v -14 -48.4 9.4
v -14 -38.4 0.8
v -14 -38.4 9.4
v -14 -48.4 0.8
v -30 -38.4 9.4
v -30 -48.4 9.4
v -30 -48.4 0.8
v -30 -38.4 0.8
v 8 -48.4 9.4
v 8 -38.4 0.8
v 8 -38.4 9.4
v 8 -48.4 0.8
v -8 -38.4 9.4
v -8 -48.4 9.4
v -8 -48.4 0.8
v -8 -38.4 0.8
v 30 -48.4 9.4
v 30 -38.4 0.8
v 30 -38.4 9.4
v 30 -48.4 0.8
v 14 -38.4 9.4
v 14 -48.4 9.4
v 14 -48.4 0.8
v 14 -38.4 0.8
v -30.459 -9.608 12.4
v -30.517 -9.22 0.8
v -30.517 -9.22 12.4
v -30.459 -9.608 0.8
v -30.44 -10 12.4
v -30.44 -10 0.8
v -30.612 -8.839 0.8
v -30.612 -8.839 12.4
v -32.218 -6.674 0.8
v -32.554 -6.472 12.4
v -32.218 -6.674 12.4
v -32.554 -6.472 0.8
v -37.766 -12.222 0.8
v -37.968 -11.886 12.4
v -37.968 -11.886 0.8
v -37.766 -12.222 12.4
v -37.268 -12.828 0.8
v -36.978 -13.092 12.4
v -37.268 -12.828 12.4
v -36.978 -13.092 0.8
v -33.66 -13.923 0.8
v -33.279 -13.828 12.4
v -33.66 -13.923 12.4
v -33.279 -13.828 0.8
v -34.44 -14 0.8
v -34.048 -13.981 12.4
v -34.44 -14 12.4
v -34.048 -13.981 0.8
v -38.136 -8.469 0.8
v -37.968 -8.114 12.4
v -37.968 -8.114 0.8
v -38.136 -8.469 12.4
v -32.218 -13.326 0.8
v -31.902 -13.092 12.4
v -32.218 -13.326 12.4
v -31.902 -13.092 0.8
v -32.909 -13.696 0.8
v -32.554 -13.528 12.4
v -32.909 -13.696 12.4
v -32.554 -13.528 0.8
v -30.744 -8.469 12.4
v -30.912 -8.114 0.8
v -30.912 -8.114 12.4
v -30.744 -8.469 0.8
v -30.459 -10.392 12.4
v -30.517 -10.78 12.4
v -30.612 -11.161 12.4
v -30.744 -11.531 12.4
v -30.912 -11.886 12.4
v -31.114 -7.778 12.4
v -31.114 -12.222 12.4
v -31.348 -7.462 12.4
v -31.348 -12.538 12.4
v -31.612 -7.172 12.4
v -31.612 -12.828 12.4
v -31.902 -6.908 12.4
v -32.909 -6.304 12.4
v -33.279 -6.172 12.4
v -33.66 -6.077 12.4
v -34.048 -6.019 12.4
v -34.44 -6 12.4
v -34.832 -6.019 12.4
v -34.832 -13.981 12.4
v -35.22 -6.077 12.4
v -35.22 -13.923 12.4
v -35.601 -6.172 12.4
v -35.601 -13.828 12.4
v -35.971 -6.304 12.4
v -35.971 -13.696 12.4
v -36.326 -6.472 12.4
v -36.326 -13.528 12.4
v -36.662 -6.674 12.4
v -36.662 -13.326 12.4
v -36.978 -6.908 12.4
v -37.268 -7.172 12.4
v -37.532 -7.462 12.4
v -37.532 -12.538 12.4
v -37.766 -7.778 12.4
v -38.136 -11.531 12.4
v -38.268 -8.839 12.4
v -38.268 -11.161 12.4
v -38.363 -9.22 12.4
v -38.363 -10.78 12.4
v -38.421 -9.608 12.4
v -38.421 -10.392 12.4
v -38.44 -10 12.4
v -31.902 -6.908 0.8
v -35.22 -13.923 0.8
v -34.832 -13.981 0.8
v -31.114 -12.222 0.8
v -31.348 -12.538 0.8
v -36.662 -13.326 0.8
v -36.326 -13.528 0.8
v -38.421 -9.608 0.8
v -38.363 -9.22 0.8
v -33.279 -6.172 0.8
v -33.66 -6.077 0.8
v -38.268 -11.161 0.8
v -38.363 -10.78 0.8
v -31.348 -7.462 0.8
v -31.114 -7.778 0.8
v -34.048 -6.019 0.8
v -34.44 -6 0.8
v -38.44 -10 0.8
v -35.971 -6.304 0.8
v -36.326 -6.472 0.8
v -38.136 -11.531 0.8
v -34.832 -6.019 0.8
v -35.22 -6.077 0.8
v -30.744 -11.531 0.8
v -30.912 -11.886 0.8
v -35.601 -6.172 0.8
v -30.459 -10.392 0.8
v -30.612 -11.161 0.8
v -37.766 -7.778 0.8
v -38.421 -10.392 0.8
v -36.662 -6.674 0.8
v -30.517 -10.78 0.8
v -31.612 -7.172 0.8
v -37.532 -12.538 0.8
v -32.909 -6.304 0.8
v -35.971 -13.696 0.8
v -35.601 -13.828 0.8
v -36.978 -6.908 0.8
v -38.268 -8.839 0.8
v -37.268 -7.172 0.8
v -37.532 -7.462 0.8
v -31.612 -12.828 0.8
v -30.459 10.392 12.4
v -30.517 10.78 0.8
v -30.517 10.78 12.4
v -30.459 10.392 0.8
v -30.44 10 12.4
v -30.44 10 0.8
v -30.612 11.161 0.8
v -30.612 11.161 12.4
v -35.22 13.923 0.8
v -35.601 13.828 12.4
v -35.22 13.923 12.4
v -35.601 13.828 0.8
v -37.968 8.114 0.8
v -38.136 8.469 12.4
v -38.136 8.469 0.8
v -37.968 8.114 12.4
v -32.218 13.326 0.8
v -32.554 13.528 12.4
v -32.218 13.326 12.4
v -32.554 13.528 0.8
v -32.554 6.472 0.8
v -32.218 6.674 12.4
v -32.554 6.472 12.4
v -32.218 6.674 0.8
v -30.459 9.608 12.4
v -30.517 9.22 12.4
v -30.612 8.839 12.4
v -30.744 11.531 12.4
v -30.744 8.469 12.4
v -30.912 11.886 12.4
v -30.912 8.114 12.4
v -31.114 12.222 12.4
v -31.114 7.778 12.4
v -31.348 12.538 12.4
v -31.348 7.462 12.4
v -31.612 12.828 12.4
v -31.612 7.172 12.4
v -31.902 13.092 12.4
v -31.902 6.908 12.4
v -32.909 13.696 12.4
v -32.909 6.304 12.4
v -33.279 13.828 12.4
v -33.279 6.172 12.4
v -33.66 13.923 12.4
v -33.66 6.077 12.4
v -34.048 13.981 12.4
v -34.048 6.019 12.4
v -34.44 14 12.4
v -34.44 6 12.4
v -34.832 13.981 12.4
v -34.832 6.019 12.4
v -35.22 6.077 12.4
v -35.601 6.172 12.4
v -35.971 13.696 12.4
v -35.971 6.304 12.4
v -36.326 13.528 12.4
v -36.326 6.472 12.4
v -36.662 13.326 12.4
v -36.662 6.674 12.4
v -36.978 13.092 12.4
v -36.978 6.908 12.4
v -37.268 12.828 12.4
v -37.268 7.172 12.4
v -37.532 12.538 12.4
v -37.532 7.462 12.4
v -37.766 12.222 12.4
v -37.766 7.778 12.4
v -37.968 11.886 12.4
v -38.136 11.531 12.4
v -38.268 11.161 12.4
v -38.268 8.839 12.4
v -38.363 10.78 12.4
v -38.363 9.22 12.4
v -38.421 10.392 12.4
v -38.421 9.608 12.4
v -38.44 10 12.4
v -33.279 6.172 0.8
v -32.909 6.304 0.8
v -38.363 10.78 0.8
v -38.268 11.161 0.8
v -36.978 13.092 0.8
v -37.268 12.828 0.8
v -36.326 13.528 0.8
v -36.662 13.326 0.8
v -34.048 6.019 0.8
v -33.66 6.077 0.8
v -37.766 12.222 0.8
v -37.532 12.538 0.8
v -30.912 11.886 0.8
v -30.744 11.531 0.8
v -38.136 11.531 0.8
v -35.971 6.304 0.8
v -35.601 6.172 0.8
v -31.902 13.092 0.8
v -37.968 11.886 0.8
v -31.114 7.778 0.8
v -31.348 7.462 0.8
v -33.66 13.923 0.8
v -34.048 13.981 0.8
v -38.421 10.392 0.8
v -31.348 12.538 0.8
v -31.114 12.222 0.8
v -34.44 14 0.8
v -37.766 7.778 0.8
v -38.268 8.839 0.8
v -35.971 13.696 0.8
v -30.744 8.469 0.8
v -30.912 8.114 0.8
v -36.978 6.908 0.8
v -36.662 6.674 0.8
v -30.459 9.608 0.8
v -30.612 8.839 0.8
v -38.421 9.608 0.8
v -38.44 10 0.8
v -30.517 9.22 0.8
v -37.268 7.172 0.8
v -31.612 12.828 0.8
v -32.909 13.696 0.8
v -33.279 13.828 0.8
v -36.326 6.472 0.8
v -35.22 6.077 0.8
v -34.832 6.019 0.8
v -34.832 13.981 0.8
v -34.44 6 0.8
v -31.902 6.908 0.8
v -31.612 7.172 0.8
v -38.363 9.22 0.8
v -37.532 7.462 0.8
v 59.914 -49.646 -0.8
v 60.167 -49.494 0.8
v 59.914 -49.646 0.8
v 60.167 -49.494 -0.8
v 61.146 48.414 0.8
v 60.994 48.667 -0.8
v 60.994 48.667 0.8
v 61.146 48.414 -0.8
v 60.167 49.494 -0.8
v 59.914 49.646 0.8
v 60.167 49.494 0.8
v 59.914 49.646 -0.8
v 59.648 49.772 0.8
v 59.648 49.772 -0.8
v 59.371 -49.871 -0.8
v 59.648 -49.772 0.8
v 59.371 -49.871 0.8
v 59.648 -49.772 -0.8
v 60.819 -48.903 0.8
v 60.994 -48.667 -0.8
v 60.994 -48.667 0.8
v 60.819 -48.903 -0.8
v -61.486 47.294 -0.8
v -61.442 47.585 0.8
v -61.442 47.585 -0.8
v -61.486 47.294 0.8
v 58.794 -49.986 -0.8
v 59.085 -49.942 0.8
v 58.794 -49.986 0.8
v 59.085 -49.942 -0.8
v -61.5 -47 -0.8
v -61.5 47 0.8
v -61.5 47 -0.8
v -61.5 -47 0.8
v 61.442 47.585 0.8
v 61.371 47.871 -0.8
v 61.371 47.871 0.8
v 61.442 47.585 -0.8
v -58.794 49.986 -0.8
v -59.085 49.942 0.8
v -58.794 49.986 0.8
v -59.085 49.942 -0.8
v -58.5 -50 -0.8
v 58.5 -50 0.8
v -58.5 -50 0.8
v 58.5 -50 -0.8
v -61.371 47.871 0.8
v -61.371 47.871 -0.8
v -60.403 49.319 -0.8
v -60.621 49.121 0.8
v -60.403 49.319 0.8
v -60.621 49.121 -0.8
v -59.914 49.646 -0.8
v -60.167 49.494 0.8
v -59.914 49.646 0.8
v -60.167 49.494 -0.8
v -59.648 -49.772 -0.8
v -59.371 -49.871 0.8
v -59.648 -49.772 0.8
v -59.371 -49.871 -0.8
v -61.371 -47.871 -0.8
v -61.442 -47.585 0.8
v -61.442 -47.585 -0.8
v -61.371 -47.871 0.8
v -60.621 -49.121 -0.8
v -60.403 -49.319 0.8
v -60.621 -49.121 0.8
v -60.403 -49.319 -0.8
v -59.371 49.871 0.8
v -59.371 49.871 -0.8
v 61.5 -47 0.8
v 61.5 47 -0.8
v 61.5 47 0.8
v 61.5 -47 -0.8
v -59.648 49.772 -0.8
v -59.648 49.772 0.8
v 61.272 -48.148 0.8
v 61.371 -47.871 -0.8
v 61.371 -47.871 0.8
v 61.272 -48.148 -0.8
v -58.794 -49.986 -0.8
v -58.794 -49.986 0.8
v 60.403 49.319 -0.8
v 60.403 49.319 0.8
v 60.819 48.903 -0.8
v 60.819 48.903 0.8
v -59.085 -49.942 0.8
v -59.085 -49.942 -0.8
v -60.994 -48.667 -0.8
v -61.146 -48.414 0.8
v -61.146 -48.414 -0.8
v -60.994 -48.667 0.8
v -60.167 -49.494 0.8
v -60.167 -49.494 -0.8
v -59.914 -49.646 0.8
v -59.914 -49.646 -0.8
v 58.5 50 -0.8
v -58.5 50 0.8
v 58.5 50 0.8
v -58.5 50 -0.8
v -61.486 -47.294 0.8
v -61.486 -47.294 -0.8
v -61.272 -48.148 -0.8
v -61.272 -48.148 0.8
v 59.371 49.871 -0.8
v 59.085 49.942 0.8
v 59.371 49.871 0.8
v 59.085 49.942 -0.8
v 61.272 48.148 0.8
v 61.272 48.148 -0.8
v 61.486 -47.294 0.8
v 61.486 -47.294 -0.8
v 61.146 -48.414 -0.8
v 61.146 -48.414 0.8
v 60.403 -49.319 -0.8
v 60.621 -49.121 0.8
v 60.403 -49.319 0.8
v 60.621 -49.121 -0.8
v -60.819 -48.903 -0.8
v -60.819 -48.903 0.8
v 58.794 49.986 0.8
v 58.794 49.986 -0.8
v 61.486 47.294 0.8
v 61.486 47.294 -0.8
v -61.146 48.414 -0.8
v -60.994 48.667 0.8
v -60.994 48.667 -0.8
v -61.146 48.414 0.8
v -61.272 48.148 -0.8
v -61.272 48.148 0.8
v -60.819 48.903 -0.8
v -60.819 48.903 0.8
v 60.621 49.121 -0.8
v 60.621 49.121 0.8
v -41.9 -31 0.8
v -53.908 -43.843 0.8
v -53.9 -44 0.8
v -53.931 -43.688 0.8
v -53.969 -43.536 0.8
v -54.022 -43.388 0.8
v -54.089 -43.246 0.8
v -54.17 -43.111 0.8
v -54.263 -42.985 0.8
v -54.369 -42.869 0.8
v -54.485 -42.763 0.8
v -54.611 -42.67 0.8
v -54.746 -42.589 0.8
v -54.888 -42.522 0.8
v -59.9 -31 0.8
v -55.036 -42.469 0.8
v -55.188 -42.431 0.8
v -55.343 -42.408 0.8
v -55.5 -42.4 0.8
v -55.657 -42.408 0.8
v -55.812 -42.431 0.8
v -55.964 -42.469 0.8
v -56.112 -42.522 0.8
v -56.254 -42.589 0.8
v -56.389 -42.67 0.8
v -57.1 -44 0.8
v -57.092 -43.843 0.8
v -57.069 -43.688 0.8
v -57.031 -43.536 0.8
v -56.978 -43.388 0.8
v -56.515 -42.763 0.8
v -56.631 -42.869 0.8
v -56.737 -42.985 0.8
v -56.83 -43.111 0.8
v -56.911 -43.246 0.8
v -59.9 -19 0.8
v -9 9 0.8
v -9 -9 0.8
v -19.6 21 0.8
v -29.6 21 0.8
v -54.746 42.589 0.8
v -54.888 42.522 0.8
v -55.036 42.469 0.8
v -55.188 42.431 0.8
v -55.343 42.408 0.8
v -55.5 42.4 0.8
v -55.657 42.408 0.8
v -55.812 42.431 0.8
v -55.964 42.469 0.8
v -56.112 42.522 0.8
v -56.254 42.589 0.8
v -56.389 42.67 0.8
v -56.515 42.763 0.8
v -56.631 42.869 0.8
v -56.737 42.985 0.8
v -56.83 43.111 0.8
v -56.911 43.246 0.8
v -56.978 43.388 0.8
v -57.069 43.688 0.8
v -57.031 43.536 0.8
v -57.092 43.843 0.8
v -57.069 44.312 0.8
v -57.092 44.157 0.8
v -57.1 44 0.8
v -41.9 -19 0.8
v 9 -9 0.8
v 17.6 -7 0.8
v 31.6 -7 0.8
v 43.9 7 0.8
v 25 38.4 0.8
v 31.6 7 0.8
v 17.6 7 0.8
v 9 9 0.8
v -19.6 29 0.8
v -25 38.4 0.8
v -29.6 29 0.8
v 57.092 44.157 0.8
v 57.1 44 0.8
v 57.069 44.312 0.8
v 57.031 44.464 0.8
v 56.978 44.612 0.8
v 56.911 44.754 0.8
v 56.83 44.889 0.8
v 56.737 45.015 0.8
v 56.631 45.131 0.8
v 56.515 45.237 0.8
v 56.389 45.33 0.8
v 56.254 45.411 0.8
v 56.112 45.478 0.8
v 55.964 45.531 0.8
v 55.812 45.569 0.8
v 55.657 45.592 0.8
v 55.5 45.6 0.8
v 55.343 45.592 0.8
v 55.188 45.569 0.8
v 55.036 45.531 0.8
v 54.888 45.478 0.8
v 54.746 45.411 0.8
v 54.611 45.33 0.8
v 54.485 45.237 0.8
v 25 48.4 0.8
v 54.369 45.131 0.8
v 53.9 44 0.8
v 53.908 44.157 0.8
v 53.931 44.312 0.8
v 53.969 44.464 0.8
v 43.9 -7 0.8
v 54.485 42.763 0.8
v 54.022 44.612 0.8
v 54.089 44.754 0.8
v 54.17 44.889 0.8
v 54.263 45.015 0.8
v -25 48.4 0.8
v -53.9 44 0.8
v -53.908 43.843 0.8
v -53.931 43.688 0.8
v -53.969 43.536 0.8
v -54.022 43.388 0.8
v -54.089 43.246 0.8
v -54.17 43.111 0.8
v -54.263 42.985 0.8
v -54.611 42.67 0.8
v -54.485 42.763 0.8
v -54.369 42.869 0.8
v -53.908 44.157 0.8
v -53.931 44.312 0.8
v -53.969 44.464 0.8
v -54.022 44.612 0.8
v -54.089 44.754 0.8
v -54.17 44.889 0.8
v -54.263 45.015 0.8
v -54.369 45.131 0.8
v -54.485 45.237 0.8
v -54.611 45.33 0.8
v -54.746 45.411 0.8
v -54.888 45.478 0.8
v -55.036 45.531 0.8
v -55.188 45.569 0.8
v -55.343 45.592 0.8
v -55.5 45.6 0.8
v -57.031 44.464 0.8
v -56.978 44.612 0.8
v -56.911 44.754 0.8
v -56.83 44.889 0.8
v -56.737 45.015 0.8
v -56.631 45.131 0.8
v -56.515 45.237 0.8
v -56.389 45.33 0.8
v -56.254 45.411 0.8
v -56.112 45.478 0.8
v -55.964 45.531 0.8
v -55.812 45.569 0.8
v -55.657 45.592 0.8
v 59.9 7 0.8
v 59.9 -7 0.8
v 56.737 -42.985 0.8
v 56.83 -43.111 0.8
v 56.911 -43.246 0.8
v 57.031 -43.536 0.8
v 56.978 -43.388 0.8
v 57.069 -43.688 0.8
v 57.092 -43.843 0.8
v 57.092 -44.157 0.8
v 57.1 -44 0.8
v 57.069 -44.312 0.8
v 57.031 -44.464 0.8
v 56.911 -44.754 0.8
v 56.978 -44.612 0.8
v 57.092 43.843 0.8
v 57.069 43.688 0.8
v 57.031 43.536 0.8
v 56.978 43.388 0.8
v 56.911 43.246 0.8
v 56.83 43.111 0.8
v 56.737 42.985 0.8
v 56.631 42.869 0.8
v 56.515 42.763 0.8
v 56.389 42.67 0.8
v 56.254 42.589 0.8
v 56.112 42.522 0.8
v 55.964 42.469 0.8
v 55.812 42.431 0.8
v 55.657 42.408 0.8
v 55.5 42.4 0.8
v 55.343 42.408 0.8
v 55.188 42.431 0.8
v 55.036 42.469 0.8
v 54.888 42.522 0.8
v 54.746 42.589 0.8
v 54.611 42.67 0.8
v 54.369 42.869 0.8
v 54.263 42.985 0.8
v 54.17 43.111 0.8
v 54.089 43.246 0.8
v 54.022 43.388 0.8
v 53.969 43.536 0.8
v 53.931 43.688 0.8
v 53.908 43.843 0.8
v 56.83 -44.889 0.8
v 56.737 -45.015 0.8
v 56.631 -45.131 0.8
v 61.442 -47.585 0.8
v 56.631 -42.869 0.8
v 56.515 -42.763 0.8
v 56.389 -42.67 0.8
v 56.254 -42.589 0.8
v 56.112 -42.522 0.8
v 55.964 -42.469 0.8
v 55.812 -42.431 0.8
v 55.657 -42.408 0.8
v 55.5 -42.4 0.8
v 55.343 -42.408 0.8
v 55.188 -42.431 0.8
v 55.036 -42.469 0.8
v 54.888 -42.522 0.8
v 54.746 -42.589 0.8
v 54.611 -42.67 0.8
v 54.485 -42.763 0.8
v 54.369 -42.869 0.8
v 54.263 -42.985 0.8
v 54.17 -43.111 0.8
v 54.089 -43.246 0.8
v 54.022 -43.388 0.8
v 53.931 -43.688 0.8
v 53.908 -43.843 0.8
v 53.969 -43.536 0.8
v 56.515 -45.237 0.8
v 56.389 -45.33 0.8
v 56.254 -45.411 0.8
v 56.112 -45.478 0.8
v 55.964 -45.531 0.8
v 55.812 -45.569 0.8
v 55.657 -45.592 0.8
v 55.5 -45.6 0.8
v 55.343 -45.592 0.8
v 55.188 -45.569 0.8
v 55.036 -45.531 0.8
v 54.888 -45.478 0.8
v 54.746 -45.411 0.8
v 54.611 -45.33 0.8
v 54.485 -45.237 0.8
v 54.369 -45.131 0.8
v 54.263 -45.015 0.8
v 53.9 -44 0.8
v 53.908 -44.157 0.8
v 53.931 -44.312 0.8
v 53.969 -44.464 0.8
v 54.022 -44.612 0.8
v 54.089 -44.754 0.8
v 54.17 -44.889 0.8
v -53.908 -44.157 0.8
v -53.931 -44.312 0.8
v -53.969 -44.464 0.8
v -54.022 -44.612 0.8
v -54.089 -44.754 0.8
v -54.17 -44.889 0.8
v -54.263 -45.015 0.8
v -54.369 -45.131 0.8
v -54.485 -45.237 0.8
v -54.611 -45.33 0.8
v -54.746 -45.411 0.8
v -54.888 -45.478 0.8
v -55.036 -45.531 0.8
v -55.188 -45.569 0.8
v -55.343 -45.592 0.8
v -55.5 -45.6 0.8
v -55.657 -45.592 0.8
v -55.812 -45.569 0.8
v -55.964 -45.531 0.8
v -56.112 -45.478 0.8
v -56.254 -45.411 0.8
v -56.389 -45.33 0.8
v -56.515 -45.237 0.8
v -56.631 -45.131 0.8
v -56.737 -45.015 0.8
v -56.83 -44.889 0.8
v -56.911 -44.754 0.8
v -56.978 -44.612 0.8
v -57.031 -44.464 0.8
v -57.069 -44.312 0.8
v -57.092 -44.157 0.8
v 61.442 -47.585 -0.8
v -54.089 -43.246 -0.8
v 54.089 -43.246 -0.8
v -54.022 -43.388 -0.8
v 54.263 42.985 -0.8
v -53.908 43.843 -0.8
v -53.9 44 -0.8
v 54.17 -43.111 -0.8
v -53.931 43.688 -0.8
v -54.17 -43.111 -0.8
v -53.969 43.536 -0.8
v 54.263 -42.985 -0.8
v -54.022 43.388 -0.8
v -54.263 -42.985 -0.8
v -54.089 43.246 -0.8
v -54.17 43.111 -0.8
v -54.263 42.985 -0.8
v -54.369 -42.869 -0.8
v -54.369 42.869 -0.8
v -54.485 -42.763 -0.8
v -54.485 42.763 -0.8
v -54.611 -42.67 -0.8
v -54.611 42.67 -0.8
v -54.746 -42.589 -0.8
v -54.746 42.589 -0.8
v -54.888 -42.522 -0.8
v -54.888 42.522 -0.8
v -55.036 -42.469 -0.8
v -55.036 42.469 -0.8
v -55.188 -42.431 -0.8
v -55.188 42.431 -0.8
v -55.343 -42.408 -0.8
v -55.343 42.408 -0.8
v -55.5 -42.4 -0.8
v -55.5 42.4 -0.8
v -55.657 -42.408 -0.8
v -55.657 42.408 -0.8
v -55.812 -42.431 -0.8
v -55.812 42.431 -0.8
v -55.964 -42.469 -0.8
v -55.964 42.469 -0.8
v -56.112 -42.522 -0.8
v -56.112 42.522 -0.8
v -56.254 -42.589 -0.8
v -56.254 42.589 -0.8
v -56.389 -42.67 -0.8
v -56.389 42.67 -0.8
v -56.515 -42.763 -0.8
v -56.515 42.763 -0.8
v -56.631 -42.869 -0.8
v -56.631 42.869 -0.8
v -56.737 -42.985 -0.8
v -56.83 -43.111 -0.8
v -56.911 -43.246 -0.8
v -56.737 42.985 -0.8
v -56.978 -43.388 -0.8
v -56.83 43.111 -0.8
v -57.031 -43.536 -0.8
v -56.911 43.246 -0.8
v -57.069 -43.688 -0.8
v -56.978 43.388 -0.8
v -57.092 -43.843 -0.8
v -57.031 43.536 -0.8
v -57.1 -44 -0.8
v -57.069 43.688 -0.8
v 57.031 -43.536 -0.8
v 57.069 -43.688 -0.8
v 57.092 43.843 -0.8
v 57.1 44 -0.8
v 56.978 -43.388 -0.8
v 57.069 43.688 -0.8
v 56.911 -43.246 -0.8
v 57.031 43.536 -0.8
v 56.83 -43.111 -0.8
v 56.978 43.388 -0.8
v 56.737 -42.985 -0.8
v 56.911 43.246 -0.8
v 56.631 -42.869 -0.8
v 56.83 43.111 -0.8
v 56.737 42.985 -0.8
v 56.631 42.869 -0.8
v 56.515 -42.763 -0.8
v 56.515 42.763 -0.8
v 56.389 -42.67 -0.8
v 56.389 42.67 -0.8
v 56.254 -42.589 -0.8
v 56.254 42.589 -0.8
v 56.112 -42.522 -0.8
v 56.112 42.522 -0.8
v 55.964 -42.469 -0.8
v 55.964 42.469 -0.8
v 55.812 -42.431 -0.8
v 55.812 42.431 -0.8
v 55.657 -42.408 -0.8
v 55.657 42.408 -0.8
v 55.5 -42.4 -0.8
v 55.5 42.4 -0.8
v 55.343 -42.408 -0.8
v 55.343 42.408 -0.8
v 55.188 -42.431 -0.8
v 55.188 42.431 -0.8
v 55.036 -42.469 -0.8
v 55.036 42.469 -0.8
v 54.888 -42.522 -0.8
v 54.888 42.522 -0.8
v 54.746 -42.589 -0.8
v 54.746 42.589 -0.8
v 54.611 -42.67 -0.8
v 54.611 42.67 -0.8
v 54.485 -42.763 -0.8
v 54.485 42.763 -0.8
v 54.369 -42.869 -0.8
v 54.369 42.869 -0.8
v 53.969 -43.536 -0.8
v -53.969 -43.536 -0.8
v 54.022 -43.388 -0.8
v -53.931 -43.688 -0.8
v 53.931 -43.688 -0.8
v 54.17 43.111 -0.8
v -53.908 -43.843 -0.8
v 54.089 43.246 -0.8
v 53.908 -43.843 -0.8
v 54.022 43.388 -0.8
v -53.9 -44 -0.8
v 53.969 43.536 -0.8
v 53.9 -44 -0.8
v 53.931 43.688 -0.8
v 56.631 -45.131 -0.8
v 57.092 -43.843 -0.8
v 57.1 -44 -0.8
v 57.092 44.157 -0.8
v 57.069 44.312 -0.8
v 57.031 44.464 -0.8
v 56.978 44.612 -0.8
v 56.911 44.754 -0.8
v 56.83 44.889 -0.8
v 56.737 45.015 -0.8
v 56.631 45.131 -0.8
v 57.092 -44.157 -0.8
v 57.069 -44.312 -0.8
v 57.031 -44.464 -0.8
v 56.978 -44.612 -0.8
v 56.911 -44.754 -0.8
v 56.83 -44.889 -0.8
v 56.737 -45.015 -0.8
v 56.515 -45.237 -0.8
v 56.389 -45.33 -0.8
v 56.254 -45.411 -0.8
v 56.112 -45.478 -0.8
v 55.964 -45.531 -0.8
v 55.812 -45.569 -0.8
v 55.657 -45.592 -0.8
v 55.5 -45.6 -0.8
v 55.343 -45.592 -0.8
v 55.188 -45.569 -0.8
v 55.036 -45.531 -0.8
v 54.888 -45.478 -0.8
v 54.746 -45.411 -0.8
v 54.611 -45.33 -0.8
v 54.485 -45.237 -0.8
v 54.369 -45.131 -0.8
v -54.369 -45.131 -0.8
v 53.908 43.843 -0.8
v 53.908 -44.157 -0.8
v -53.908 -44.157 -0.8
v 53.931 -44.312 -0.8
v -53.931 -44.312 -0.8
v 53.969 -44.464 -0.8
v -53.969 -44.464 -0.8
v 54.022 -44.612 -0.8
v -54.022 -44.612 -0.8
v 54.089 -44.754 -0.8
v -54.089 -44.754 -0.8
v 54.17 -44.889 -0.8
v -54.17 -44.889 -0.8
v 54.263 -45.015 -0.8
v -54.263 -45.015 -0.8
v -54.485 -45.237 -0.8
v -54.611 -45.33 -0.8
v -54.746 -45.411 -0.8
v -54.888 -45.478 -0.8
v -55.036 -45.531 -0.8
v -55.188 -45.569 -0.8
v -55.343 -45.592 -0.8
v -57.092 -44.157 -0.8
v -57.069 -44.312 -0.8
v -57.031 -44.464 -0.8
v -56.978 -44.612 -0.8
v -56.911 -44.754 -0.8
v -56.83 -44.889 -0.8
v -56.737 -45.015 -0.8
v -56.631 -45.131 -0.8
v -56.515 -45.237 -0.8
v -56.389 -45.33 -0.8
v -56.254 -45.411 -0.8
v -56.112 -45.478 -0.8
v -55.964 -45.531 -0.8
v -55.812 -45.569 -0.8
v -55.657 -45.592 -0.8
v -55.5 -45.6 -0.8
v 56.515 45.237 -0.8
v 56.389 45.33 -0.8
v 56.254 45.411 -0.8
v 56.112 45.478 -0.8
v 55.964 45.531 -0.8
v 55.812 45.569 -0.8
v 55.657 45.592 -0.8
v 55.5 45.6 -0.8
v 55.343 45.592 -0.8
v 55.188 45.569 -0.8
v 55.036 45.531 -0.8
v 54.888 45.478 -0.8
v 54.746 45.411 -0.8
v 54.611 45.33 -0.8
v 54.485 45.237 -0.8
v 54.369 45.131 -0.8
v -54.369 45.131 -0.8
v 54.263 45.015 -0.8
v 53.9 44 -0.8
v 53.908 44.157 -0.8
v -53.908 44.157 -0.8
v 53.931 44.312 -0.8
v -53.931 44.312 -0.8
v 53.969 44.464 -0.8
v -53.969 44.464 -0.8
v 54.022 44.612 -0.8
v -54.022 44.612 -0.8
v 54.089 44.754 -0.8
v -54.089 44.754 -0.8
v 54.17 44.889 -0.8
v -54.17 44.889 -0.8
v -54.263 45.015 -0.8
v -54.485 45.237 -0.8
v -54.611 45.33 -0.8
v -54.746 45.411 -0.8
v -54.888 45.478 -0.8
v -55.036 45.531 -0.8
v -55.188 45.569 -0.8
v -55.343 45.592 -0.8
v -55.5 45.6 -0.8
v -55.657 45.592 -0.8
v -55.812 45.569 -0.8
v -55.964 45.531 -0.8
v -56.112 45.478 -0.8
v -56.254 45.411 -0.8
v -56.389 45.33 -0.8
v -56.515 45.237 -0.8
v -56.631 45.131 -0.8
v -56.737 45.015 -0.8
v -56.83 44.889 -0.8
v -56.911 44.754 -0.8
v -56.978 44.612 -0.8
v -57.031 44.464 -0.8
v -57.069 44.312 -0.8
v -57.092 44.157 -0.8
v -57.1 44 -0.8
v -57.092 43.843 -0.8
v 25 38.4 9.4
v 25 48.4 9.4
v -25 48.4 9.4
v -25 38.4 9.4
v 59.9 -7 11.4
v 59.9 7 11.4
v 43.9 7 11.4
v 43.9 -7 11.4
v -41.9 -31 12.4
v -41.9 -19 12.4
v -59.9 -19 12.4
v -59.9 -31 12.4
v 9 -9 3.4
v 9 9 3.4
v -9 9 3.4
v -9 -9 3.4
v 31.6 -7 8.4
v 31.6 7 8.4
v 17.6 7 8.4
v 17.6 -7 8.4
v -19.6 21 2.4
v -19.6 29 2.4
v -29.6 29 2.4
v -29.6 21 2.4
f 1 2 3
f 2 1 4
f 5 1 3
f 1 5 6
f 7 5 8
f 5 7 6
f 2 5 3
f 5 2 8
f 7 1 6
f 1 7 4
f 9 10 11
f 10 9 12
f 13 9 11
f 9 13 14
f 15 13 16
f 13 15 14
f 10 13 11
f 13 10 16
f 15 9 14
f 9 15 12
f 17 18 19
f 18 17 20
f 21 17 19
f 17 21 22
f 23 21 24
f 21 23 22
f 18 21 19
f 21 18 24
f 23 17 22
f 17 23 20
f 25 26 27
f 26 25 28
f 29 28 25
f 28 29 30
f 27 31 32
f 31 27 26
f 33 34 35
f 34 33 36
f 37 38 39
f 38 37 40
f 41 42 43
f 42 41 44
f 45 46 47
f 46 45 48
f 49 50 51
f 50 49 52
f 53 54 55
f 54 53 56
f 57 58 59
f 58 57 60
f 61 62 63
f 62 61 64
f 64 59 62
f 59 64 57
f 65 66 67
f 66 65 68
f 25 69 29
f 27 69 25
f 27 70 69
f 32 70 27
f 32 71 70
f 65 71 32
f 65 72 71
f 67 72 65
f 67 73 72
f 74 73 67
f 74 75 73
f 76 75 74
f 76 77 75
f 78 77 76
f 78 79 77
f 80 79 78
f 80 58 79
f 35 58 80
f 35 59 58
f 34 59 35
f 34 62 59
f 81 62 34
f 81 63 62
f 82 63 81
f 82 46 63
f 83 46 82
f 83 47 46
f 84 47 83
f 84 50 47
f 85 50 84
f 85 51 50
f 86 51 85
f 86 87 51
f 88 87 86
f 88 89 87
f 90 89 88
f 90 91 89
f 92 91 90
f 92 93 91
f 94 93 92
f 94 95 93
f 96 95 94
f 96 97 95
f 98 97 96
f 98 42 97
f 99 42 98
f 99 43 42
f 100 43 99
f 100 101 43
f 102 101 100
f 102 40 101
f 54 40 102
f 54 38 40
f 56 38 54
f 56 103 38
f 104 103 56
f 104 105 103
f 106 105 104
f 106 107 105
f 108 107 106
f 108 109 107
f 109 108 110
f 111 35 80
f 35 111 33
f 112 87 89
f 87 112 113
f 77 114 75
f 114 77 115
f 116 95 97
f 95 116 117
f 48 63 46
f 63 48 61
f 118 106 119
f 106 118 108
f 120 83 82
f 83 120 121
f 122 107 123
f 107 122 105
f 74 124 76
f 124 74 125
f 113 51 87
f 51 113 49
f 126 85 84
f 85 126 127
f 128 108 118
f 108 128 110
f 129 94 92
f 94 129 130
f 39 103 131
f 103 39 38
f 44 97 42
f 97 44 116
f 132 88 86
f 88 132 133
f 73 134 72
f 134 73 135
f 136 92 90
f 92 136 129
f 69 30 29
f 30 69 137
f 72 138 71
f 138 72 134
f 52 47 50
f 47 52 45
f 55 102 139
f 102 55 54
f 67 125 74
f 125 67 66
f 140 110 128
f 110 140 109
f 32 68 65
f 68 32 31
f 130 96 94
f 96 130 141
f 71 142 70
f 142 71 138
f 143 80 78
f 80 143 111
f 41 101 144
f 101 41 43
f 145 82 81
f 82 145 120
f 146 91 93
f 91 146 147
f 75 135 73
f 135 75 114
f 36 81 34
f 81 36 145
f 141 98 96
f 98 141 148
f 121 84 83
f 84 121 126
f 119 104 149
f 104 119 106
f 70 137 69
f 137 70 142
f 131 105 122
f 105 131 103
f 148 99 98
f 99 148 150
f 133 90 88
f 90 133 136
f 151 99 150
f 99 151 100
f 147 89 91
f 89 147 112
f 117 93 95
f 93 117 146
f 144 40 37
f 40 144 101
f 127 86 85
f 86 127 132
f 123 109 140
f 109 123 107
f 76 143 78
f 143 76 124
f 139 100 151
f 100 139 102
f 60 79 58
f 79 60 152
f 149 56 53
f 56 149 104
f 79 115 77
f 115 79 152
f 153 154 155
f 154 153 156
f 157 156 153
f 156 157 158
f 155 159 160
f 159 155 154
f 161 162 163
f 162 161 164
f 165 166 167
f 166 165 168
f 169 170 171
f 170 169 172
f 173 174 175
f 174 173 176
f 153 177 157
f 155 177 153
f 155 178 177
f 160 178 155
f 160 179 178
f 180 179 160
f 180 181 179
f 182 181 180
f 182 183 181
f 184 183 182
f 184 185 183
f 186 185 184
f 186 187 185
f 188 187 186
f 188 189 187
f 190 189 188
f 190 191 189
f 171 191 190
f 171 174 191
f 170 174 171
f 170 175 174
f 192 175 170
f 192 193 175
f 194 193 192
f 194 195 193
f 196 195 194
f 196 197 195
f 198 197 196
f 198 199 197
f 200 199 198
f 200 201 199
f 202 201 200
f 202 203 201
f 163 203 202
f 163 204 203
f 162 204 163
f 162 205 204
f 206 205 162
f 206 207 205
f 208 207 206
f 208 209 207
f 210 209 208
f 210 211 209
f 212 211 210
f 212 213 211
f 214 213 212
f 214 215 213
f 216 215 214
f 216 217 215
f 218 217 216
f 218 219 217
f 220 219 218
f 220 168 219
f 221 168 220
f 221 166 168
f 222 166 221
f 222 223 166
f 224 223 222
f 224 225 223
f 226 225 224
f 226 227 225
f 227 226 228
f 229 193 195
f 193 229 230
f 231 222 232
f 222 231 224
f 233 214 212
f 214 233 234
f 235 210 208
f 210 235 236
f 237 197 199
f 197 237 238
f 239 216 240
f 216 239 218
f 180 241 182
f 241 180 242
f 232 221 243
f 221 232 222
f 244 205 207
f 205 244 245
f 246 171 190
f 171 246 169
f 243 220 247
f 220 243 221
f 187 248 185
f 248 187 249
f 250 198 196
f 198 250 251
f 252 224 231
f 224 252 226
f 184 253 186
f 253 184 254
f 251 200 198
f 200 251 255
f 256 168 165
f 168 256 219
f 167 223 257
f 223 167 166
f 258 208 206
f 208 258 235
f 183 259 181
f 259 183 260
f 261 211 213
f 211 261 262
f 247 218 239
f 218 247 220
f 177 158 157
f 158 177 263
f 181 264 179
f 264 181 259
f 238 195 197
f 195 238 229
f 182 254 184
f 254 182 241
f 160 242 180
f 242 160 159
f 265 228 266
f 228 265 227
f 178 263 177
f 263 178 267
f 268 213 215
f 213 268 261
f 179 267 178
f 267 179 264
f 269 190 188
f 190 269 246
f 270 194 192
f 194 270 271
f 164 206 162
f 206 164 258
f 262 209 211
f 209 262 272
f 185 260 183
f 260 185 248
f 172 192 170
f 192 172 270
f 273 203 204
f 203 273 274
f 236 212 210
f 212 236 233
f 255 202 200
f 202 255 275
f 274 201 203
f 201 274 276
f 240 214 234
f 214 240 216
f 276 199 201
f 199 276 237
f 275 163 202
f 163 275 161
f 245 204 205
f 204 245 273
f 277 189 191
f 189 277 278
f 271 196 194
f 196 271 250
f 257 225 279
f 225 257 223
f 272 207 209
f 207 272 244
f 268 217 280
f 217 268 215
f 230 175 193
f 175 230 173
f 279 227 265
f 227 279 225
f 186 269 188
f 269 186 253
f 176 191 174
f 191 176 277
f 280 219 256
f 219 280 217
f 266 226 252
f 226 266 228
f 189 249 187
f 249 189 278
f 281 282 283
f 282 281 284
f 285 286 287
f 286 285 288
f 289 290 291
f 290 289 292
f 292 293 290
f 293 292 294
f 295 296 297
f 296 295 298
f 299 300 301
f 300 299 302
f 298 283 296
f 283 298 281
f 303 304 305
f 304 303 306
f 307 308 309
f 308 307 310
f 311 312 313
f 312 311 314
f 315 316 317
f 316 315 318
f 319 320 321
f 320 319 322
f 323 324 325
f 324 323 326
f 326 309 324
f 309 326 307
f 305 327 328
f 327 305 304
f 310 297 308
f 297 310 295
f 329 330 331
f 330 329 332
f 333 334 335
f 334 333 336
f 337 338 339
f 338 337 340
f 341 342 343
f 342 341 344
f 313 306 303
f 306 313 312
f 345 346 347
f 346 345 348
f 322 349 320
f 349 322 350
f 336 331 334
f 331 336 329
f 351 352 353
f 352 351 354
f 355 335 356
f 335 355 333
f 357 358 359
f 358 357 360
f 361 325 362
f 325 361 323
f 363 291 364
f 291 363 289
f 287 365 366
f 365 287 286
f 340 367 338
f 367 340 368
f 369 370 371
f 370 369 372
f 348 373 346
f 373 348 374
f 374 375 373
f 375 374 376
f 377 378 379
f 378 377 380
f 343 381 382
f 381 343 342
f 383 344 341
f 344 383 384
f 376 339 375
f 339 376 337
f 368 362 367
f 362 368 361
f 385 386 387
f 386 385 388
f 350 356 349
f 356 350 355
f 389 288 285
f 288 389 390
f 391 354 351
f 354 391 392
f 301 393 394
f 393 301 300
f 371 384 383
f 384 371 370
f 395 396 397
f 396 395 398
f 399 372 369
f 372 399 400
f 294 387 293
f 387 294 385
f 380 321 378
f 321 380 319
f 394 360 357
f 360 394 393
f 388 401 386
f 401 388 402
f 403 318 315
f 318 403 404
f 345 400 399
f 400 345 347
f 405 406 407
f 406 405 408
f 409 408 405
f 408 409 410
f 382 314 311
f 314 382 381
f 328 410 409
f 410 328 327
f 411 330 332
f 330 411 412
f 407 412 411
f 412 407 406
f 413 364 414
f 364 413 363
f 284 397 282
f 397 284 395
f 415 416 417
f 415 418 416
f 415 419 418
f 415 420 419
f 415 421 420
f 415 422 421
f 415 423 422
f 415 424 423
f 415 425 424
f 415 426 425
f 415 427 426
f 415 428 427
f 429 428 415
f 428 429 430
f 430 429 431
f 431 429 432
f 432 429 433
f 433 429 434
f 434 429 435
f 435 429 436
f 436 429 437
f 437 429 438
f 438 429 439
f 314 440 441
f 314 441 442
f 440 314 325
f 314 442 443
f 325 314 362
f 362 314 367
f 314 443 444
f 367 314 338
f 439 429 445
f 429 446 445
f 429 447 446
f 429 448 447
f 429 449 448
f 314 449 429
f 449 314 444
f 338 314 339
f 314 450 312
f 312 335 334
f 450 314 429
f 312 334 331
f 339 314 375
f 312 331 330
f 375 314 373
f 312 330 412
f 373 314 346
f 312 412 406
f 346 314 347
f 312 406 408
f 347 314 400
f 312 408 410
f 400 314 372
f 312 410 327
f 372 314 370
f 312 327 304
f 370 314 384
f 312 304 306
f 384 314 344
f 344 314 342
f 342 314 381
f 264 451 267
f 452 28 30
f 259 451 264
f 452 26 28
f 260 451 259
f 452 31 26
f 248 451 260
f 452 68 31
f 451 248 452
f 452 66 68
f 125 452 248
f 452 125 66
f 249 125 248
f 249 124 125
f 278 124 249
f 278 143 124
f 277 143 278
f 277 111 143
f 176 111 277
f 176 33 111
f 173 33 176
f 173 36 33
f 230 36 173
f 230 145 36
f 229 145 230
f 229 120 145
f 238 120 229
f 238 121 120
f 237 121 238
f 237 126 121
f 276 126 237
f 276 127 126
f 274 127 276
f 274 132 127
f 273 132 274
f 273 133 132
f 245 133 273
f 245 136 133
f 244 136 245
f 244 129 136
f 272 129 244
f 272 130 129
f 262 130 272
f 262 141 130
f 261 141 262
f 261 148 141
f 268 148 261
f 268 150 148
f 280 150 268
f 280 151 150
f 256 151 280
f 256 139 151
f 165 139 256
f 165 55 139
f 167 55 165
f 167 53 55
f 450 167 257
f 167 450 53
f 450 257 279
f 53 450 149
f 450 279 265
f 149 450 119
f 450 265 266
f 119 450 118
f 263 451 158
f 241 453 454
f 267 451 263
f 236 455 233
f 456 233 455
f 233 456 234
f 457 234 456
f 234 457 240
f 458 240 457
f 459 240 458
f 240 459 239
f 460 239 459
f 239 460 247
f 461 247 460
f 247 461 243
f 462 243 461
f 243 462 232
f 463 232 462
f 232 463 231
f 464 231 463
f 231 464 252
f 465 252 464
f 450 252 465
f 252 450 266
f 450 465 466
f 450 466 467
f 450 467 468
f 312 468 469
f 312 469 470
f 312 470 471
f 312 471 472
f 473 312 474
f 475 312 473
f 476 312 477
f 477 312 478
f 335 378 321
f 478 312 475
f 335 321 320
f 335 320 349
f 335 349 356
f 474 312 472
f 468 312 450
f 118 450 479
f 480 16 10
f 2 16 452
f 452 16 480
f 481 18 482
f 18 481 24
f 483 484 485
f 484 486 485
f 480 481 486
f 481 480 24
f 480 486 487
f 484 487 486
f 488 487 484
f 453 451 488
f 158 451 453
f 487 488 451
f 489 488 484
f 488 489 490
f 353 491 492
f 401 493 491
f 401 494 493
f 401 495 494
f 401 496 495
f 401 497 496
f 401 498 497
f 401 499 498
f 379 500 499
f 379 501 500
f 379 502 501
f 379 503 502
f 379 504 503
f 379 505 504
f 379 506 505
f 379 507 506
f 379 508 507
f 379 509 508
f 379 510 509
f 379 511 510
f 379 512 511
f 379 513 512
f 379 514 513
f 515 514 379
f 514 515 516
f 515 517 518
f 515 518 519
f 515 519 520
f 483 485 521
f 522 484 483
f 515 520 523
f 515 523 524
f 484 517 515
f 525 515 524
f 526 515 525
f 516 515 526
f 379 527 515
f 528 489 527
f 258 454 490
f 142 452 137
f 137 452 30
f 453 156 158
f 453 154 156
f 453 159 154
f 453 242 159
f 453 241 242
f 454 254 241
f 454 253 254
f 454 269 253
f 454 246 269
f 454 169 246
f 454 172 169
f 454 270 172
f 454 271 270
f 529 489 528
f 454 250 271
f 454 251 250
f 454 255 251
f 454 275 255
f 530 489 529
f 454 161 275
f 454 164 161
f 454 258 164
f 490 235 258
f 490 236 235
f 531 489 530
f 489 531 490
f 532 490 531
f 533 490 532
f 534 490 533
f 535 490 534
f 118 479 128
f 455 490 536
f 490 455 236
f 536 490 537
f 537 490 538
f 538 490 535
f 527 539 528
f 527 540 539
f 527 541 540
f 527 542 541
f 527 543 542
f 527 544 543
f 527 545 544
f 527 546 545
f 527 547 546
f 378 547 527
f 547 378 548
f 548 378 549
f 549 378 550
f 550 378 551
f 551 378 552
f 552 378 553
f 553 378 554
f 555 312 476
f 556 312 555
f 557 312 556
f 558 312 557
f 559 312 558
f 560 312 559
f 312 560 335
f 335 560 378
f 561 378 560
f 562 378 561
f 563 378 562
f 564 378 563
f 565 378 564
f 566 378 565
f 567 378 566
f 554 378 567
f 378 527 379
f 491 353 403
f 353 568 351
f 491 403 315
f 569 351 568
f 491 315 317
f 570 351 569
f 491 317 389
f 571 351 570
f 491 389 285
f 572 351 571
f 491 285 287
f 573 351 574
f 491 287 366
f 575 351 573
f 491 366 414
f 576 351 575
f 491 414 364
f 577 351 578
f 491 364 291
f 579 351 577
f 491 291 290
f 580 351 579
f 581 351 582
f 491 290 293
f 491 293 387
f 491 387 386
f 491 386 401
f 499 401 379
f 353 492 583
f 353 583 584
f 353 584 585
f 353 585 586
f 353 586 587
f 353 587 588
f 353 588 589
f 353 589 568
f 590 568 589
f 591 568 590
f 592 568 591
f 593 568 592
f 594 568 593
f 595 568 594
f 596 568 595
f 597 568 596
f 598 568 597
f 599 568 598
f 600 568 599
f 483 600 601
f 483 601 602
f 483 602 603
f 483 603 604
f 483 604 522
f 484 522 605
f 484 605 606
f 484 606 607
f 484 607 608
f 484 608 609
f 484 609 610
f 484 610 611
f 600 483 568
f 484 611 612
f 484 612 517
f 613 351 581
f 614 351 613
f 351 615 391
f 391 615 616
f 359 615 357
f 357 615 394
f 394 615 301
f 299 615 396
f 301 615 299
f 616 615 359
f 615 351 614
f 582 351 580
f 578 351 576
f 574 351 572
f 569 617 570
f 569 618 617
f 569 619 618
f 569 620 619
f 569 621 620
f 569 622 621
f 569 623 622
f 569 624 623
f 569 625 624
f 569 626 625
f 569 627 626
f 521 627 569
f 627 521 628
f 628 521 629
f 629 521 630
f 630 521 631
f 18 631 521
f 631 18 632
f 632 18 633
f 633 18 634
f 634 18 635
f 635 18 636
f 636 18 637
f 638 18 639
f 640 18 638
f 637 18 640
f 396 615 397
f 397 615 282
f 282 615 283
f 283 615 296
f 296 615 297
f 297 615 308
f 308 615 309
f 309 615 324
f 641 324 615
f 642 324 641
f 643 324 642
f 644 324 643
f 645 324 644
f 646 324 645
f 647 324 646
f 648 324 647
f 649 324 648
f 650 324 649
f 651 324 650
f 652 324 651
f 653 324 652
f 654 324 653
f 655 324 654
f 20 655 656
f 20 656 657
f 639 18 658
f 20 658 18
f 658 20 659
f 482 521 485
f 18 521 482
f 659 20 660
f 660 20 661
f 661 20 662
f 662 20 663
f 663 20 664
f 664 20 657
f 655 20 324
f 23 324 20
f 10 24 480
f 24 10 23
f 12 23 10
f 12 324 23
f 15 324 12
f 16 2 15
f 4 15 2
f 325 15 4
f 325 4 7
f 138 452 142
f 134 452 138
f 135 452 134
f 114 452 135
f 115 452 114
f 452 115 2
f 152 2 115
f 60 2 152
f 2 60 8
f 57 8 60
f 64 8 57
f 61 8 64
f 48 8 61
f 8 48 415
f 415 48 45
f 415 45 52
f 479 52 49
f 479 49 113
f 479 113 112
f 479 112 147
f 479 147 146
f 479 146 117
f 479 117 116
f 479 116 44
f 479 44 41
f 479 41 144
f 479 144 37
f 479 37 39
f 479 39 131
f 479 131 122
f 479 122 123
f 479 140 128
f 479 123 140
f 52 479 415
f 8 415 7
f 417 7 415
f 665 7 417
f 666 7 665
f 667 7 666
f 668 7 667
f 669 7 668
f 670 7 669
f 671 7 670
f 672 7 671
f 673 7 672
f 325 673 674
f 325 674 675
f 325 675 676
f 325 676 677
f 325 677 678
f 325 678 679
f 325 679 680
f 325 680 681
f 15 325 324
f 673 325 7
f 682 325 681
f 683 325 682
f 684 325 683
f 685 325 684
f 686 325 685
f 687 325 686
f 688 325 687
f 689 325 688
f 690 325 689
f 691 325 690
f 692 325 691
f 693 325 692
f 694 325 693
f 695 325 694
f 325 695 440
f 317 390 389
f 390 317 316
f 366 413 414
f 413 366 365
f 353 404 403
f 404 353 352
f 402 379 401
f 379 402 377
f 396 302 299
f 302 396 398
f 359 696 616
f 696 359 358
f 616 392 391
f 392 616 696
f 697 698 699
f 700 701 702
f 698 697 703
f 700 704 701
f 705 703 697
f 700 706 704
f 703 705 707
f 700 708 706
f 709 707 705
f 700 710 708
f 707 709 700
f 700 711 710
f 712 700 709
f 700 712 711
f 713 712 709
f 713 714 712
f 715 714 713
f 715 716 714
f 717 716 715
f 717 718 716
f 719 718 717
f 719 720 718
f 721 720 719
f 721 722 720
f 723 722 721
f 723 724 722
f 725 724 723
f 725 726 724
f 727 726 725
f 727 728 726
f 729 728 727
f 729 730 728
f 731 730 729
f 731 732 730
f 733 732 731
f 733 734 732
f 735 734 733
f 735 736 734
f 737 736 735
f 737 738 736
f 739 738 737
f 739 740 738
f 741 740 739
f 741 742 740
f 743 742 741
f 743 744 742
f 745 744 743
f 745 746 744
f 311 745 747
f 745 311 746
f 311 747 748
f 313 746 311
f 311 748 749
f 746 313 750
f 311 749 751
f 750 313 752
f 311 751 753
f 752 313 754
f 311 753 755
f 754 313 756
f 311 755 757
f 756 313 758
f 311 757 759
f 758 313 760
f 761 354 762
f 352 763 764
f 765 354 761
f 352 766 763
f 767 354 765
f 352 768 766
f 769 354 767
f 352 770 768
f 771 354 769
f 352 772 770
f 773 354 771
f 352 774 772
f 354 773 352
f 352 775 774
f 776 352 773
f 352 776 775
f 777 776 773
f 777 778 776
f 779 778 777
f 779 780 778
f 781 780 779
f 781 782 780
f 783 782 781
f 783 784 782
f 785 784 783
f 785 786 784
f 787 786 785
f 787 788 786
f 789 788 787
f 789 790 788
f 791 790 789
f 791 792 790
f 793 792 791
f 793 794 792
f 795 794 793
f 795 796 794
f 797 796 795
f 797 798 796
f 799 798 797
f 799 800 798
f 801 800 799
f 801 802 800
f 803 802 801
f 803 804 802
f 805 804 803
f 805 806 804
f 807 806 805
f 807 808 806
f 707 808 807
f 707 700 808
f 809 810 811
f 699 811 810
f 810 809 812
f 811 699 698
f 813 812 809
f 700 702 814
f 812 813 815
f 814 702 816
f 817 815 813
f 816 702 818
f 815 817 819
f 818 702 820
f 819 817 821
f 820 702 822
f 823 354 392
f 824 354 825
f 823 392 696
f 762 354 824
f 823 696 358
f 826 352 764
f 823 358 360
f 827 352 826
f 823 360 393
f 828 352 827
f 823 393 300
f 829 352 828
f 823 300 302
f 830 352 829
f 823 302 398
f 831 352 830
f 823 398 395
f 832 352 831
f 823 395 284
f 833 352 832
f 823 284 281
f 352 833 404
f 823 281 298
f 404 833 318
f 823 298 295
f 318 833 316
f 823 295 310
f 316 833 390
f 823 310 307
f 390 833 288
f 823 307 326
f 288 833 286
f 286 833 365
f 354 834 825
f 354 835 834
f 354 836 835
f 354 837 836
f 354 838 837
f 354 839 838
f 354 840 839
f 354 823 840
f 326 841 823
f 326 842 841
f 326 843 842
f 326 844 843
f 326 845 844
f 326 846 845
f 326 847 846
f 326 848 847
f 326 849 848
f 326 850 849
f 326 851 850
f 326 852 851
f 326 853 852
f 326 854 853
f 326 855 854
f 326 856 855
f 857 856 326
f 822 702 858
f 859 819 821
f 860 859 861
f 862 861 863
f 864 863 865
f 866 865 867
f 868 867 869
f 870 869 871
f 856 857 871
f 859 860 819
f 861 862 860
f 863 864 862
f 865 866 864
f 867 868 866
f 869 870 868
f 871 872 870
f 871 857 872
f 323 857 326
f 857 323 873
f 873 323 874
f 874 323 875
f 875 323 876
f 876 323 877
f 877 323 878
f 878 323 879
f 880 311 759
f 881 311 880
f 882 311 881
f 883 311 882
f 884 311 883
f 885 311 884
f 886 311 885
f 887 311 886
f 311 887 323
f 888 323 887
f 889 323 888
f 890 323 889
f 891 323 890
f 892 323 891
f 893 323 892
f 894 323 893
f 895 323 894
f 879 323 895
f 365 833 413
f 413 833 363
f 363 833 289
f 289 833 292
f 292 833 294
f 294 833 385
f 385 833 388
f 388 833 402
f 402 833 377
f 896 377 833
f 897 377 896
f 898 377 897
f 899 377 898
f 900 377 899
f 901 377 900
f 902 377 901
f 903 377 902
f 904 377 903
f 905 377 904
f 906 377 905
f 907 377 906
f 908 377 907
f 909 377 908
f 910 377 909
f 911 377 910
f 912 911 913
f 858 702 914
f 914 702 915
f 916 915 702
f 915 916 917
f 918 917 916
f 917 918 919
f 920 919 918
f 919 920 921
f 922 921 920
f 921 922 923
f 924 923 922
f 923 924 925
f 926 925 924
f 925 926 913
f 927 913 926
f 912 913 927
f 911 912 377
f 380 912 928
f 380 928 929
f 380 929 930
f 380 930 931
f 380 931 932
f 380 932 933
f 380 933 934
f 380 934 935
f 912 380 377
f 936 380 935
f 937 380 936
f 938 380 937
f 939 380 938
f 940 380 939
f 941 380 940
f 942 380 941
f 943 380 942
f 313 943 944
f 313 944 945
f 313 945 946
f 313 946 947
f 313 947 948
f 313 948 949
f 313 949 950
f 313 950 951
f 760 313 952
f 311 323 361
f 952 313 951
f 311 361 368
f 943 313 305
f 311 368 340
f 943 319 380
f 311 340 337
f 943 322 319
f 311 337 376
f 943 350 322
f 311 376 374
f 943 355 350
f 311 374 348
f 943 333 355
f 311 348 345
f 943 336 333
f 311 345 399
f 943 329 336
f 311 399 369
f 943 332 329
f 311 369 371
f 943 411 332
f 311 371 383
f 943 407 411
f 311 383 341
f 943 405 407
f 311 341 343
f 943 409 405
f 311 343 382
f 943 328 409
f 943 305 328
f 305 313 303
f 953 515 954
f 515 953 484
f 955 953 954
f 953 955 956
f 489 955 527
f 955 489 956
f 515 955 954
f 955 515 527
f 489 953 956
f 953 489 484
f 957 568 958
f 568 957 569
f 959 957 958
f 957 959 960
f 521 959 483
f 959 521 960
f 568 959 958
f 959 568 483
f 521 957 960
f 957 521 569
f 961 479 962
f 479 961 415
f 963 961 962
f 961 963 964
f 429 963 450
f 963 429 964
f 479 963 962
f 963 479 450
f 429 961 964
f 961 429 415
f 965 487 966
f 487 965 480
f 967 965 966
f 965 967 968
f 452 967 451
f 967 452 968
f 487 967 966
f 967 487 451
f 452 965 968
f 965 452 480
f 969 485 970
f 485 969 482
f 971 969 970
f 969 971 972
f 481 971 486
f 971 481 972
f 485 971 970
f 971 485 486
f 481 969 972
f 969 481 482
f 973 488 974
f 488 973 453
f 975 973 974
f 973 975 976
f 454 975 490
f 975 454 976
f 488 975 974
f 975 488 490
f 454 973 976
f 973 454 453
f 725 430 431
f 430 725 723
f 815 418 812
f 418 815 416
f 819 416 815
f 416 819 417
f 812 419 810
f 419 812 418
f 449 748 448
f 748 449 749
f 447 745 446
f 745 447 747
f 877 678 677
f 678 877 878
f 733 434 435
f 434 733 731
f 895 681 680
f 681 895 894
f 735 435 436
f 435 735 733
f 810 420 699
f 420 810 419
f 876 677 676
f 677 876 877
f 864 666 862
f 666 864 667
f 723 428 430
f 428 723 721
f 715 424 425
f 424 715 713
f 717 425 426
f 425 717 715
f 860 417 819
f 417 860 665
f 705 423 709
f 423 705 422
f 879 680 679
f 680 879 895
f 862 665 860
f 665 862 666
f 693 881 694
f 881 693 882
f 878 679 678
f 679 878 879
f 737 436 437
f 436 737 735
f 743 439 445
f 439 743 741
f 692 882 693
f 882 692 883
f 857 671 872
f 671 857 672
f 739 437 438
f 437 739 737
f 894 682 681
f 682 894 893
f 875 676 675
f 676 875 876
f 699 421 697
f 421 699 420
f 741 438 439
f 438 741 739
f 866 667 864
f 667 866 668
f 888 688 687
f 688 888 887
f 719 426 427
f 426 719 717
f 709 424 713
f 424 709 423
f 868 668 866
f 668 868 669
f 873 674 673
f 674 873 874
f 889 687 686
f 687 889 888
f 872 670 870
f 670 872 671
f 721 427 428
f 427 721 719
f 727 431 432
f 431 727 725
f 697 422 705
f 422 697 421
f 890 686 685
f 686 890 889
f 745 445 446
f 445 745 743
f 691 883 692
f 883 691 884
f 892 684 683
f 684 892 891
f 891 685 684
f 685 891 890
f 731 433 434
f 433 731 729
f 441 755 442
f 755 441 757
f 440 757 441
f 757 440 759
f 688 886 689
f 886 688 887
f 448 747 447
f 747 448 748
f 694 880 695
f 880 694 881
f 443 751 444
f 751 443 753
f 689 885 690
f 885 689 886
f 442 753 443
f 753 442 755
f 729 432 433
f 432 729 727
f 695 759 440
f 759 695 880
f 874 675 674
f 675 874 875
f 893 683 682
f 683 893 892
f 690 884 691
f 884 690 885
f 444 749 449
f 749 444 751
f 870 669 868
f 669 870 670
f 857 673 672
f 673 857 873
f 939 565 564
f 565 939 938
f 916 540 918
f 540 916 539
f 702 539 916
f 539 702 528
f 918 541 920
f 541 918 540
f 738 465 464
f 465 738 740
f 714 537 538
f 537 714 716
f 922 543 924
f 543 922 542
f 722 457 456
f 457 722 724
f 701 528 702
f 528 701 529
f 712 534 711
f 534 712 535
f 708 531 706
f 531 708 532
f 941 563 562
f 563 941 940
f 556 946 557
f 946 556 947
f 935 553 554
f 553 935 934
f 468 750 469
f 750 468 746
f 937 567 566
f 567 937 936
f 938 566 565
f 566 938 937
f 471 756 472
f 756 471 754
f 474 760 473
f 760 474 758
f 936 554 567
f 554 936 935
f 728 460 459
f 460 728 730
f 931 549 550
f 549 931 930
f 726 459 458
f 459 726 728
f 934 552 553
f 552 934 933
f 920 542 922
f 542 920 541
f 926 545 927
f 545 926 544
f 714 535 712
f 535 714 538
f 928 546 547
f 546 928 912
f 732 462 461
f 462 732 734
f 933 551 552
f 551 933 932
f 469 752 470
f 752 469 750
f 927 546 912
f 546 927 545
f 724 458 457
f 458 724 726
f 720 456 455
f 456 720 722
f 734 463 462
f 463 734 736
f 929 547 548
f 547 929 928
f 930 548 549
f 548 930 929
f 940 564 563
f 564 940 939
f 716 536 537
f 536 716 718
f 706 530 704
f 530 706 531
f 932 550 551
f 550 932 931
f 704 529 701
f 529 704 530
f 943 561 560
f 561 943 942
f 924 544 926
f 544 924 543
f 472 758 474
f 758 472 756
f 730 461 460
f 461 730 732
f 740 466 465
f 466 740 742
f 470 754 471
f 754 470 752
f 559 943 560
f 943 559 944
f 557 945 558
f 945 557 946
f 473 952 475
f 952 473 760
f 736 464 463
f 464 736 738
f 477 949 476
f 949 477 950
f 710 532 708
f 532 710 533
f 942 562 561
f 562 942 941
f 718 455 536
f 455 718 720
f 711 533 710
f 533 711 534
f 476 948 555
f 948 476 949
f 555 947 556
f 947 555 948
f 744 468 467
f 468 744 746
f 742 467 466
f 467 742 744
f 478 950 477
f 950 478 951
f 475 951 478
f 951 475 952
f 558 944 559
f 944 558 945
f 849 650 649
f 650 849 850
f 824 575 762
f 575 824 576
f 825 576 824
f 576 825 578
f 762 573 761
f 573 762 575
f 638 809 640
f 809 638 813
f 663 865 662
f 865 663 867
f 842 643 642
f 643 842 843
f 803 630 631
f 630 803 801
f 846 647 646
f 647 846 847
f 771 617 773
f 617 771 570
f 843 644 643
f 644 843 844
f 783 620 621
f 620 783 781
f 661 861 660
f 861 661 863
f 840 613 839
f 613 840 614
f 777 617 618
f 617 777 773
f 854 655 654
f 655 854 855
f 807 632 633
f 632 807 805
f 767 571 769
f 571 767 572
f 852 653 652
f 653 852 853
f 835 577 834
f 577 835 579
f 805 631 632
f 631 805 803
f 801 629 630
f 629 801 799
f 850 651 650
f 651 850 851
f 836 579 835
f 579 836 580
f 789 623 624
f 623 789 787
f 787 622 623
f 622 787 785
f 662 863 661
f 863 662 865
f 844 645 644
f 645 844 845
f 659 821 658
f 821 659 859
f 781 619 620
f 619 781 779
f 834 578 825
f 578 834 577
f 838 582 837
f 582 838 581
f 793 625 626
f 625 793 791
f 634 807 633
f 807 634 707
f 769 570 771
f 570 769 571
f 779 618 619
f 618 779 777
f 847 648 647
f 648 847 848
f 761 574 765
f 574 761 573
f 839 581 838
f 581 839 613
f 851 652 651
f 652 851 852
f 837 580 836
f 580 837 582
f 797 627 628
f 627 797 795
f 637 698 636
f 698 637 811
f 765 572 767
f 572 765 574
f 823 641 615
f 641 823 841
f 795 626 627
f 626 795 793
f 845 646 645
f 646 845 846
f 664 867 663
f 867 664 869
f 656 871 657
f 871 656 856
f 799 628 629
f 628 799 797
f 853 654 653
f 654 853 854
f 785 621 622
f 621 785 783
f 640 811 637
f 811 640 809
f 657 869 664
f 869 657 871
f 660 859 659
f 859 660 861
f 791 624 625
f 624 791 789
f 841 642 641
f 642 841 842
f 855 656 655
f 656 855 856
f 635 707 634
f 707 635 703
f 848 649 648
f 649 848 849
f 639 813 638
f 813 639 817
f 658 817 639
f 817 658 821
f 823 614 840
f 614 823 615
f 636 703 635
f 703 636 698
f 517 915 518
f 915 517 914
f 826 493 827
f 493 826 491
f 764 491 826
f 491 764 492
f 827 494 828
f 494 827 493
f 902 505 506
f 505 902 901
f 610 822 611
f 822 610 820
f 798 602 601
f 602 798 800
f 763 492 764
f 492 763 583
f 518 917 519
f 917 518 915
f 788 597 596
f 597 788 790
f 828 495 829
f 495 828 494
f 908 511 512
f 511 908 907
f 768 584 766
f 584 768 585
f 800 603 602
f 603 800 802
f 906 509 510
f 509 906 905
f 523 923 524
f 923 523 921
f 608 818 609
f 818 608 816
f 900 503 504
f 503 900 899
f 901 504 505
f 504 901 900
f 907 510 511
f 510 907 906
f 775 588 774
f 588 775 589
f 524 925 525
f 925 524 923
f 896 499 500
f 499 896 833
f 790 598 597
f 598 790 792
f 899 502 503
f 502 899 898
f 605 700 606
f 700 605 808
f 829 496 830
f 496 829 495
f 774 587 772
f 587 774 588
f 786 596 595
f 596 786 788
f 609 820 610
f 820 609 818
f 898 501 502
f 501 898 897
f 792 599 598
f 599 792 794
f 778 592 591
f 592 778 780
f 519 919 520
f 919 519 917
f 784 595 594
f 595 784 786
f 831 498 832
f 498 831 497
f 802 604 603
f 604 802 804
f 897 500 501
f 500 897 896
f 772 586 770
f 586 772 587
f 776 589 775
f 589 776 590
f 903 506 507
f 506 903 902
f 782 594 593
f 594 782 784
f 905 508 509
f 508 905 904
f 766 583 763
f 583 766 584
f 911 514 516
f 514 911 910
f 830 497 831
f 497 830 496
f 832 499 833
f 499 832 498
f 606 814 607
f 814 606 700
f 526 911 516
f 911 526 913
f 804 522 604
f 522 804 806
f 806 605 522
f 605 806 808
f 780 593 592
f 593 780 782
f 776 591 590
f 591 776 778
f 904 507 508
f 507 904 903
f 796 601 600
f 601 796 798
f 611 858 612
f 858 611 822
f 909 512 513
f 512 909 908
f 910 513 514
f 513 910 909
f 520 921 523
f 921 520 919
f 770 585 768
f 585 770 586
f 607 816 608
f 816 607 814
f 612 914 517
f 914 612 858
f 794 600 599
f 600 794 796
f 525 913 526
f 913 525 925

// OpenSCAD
$fn = 64;

// Parameters (exact PCB size)
board_length = 123.0;   // X
board_width  = 100.0;   // Y
board_thickness = 1.6;  // Z

// Small overlap to guarantee one connected solid
eps = 0.4;

// ---------- Helpers ----------
module rounded_rect_prism(l, w, h, r) {
    // Rounded rectangle extruded to height h, centered
    linear_extrude(height=h, center=true)
        offset(r=r)
            square([l - 2*r, w - 2*r], center=true);
}

module box_centered(size=[10,10,10]) {
    cube(size, center=true);
}

// ---------- Main Model ----------
module printer_control_board() {

    // PCB base with mounting holes removed (holes are voids; remaining solid is connected)
    corner_r = 3.0;
    hole_d = 3.2;
    hole_r = hole_d/2;

    // Place holes with formula-based offsets from edges
    hole_edge_x = 6.0;
    hole_edge_y = 6.0;

    // Z references
    pcb_top_z = board_thickness/2;
    pcb_bot_z = -board_thickness/2;

    // Component heights
    comp_clear = eps; // overlap into PCB
    header_h = 9.0;
    header_w = 10.0;
    header_l = 50.0;

    usb_w = 14.0;
    usb_l = 16.0;
    usb_h = 11.0;

    power_w = 12.0;
    power_l = 18.0;
    power_h = 12.0;

    stepper_w = 10.0;
    stepper_l = 16.0;
    stepper_h = 9.0;

    cap_d = 8.0;
    cap_h = 12.0;

    mcu_l = 18.0;
    mcu_w = 18.0;
    mcu_h = 3.0;

    heatsink_l = 14.0;
    heatsink_w = 14.0;
    heatsink_h = 8.0;

    // Positions (all formula-based from board dimensions)
    x_left  = -board_length/2;
    x_right =  board_length/2;
    y_front = -board_width/2;
    y_back  =  board_width/2;

    // Connector centerlines near edges
    edge_inset = 2.0;

    // Build as one connected solid: union of PCB + components, with holes subtracted
    difference() {
        union() {
            // PCB
            color([0.0, 0.4, 0.2])
                rounded_rect_prism(board_length, board_width, board_thickness, corner_r);

            // --- Major connectors/components on top side (all overlap into PCB by eps) ---
            // Long pin header along back edge
            translate([0,
                       y_back - edge_inset - header_w/2 + eps,
                       pcb_top_z + header_h/2 - comp_clear])
                color([0.1,0.1,0.1])
                    box_centered([header_l, header_w, header_h]);

            // USB connector on right edge (mid)
            translate([x_right - edge_inset - usb_l/2 + eps,
                       0,
                       pcb_top_z + usb_h/2 - comp_clear])
                color([0.75,0.75,0.75])
                    box_centered([usb_l, usb_w, usb_h]);

            // Power terminal on left edge (front-ish)
            translate([x_left + edge_inset + power_l/2 - eps,
                       y_front + board_width*0.25,
                       pcb_top_z + power_h/2 - comp_clear])
                color([0.0,0.2,0.8])
                    box_centered([power_l, power_w, power_h]);

            // Three stepper driver sockets along front edge
            for (i = [-1, 0, 1]) {
                translate([i * (stepper_l + 6.0),
                           y_front + edge_inset + stepper_w/2 - eps,
                           pcb_top_z + stepper_h/2 - comp_clear])
                    color([0.1,0.1,0.1])
                        box_centered([stepper_l, stepper_w, stepper_h]);
            }

            // MCU in center
            translate([0, 0, pcb_top_z + mcu_h/2 - comp_clear])
                color([0.15,0.15,0.15])
                    box_centered([mcu_l, mcu_w, mcu_h]);

            // Heatsink near center-right
            translate([board_length*0.20, 0, pcb_top_z + heatsink_h/2 - comp_clear])
                color([0.2,0.2,0.2])
                    box_centered([heatsink_l, heatsink_w, heatsink_h]);

            // Two electrolytic capacitors near left-middle
            for (yy = [-10, 10]) {
                translate([x_left + board_length*0.22,
                           yy,
                           pcb_top_z + cap_h/2 - comp_clear])
                    color([0.05,0.05,0.05])
                        cylinder(h=cap_h, r=cap_d/2, center=true);
            }

            // Small "chip" near back-left
            translate([x_left + board_length*0.30,
                       y_back - board_width*0.25,
                       pcb_top_z + 2.0/2 - comp_clear])
                color([0.2,0.2,0.2])
                    box_centered([10, 8, 2.0]);
        }

        // Mounting holes (through PCB only)
        for (sx = [-1, 1])
            for (sy = [-1, 1]) {
                translate([sx*(board_length/2 - hole_edge_x),
                           sy*(board_width/2  - hole_edge_y),
                           0])
                    cylinder(h=board_thickness + 2*eps, r=hole_r, center=true);
            }
    }
}

// Render
printer_control_board();
